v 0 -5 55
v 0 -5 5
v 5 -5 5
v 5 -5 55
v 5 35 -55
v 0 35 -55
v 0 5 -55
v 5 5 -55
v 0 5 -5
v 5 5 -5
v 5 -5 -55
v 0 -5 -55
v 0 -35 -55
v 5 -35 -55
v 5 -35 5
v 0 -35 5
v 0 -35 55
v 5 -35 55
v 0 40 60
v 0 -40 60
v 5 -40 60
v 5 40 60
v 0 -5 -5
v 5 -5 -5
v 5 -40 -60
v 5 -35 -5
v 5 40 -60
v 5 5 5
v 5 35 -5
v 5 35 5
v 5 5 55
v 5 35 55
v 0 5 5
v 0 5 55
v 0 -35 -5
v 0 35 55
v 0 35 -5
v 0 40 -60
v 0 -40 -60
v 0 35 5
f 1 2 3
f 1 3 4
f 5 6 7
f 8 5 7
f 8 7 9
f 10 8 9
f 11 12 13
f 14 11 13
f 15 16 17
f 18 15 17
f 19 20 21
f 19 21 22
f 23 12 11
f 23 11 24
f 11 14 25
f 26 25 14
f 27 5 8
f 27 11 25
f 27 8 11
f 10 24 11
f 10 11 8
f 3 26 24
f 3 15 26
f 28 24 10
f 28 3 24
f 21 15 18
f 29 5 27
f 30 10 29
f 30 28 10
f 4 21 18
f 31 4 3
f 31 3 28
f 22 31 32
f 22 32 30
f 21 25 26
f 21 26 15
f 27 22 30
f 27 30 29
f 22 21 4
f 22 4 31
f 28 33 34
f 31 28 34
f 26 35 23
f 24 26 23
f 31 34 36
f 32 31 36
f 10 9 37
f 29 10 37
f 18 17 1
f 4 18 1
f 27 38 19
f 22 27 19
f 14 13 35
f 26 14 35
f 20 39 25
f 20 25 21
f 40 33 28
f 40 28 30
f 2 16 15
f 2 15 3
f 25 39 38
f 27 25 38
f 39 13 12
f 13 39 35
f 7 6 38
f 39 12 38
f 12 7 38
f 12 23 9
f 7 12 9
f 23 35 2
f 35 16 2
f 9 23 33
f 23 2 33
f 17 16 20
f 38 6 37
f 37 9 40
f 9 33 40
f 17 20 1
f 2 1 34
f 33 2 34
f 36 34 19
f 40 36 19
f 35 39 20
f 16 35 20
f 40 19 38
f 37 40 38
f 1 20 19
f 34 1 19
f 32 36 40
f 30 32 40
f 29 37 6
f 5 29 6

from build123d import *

# Parameters (mm, degrees)
F0_W     = 80
F0_H     = 120
F0_W_2   = 10
F0_H_2   = 50
F0_W_3   = 30
F0_H_3   = 10
F1_DEPTH = 5


with BuildPart() as f1:
    # F0 (on Right) → F1 (new body)
    with BuildSketch(Plane.YZ):
        Rectangle(F0_W, F0_H)
        Polygon((35, -5), (35, -55), (5, -55), (-5, -55), (-35, -55), (-35, -5), (-35, 5), (-35, 55), (-5, 55), (5, 55), (35, 55), (35, 5), align=None, mode=Mode.SUBTRACT)
        with Locations((0, -30)):
            Rectangle(F0_W_2, F0_H_2)
        with Locations((0, 30)):
            Rectangle(F0_W_2, F0_H_2)
        with Locations((-20, 0)):
            Rectangle(F0_W_3, F0_H_3)
        with Locations((20, 0)):
            Rectangle(F0_W_3, F0_H_3)
        Rectangle(F0_W_2, F0_H_3)
    extrude(amount=F1_DEPTH)


solid = f1.part
